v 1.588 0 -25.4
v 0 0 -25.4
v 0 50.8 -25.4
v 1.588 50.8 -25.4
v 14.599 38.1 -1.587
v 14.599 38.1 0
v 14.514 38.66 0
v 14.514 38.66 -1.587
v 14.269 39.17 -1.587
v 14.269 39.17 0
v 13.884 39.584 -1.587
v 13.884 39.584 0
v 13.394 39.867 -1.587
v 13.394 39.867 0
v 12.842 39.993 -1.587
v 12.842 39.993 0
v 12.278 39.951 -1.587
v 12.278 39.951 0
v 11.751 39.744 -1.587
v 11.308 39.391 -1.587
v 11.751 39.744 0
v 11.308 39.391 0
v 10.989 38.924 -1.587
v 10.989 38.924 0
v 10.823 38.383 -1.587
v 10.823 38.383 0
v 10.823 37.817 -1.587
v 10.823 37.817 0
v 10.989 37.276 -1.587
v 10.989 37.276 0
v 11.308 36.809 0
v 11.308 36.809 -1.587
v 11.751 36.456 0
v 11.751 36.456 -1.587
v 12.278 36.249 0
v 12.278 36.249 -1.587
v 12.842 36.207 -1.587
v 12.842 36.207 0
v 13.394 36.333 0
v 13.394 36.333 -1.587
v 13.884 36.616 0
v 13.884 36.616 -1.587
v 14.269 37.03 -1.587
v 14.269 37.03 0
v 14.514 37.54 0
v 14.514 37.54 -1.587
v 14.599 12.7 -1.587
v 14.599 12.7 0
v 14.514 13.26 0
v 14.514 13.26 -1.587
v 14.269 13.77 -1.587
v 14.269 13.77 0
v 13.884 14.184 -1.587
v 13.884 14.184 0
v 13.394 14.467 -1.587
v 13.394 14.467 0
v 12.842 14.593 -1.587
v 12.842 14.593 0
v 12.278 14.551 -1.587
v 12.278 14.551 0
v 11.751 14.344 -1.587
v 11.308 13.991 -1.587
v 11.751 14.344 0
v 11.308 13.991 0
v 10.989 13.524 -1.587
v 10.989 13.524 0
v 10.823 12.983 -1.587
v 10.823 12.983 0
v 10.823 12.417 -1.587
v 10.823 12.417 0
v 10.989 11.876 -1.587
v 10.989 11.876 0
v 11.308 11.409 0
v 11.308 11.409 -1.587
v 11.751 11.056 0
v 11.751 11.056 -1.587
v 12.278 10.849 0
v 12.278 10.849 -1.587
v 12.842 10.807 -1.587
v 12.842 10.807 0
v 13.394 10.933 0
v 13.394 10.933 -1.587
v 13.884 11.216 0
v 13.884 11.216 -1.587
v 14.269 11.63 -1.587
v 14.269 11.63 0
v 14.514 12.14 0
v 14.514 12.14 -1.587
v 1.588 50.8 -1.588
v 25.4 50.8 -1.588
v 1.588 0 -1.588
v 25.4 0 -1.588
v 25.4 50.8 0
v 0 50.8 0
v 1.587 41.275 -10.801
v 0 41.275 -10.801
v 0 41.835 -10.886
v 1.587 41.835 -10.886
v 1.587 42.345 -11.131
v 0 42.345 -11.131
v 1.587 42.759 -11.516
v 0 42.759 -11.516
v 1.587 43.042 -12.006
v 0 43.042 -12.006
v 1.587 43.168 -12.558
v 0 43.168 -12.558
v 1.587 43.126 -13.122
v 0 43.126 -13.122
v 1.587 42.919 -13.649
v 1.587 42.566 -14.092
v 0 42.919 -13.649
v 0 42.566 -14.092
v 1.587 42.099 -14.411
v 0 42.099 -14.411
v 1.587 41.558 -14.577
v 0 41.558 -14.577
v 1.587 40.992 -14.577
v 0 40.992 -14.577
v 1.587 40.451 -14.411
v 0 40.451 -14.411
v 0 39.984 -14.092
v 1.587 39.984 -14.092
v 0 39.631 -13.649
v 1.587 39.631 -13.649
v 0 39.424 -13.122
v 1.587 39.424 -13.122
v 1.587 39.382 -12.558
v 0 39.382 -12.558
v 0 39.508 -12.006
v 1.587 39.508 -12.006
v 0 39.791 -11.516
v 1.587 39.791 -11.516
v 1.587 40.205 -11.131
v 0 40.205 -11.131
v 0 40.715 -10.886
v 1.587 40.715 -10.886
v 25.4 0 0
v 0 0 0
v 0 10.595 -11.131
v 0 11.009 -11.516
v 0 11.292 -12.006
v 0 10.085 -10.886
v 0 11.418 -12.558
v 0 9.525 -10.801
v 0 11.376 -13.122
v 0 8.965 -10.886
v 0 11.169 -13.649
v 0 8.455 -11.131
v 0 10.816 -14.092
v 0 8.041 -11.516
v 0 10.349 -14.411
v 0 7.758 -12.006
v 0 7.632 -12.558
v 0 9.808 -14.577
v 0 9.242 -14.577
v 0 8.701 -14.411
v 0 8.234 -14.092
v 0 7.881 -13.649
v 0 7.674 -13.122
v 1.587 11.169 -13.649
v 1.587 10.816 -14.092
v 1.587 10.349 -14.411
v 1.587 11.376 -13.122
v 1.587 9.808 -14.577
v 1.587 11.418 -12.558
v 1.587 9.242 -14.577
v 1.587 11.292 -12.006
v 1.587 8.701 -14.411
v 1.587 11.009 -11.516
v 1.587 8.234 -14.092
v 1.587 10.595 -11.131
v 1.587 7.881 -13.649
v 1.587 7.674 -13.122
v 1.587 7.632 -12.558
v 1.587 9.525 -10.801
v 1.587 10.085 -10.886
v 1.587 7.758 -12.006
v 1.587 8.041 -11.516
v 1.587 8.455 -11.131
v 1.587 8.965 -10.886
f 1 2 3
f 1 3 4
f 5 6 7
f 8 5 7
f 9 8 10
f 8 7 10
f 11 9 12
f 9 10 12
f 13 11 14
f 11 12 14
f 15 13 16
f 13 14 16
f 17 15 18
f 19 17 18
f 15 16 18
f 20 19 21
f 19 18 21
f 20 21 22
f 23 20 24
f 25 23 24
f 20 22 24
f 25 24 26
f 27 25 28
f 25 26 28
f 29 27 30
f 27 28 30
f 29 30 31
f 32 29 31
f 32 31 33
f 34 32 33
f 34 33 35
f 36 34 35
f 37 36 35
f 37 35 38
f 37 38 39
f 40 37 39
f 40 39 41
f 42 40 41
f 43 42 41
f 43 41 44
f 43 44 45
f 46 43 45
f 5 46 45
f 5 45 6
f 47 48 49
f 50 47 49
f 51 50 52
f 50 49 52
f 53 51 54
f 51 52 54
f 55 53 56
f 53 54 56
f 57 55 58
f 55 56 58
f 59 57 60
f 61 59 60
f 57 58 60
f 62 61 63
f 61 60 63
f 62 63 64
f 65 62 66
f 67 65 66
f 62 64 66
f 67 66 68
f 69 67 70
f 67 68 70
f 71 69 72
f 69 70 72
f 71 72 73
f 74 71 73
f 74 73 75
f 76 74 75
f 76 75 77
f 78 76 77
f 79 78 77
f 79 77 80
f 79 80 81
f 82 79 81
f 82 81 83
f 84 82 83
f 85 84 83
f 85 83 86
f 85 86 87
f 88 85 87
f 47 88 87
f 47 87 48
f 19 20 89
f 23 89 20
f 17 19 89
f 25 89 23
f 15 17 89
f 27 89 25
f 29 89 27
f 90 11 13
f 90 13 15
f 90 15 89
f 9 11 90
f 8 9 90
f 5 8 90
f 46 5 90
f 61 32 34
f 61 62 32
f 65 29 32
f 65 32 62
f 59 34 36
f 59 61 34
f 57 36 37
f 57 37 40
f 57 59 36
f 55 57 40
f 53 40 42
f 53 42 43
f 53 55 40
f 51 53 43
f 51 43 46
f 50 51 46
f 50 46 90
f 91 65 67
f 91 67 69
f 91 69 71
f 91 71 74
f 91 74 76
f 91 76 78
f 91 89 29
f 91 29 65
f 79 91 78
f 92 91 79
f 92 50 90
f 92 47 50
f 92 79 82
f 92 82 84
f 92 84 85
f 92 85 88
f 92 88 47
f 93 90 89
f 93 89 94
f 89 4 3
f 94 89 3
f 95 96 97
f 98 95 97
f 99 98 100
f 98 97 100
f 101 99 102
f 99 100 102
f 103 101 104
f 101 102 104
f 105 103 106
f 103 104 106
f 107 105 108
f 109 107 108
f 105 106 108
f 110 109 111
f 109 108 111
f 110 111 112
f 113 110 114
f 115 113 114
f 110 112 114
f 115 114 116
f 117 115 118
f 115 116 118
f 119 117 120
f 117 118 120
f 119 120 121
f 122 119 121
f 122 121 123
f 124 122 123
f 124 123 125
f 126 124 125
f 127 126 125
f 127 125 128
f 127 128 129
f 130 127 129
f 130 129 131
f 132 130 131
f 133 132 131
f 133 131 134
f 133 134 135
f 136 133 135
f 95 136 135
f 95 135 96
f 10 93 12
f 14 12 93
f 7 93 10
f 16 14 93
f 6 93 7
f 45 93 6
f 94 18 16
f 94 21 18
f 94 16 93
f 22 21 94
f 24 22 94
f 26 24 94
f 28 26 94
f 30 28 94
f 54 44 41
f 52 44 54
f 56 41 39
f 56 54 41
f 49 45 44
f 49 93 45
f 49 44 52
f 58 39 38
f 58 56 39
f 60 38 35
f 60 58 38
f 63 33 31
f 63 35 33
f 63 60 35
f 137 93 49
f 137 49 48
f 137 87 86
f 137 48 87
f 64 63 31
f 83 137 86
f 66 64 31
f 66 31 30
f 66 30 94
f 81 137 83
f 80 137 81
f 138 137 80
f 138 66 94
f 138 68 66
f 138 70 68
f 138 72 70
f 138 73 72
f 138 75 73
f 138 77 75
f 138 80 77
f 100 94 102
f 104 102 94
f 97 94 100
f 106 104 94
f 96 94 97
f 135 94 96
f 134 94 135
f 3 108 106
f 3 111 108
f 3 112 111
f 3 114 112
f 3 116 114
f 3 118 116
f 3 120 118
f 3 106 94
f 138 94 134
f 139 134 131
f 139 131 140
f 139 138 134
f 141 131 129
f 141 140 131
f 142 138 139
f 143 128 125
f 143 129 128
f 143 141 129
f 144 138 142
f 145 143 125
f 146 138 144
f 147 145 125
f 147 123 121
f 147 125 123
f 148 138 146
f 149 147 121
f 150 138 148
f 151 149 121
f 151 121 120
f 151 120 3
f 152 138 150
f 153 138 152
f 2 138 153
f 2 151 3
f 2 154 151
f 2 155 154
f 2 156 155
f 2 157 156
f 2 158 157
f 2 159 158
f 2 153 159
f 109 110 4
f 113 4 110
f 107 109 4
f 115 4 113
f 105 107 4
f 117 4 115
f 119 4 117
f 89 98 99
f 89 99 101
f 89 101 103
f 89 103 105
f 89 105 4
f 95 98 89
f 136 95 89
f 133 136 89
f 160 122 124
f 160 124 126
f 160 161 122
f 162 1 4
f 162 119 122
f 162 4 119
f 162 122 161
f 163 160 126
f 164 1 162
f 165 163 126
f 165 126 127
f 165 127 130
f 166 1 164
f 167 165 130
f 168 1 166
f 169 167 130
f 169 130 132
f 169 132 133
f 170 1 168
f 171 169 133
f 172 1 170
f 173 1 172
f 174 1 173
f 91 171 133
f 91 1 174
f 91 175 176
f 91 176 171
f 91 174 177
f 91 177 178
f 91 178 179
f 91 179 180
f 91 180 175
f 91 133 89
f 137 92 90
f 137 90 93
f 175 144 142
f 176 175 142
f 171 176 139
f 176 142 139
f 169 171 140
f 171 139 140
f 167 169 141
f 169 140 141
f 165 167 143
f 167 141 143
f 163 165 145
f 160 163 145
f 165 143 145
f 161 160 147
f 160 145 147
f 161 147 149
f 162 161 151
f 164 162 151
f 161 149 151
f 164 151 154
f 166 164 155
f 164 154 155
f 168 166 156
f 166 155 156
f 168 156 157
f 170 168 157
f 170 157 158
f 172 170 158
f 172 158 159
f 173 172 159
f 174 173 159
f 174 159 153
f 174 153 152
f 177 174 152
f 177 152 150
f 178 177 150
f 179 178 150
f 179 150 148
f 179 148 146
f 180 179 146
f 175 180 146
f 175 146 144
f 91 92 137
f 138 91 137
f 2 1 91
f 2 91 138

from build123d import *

# Parameters (mm, degrees)
BOSS_EXTRUDE1_DEPTH   = 50.8
F_6_CLEARANCE_HOLE1_D = 3.7973
F_6_CLEARANCE_HOLE2_D = 3.7973


with BuildPart() as part:
    # Sketch1 → Boss-Extrude1 (new body)
    with BuildSketch(Plane(origin=(0, 0, 0), x_dir=(1, 0, 0), z_dir=(0, 1, 0))):
        Polygon((0, 25.4), (1.5875, 25.4), (1.5875, 1.5875), (25.4, 1.5875), (25.4, 0), (0, 0), align=None)
    extrude(amount=BOSS_EXTRUDE1_DEPTH)

    # #6 Clearance Hole1 (through all)
    with Locations(Plane(origin=(0, 0, -1.5875), x_dir=(-1, 0, 0), z_dir=(0, 0, -1))):
        with Locations((-12.7, 38.1), (-12.7, 12.7)):
            Hole(F_6_CLEARANCE_HOLE1_D / 2)

    # #6 Clearance Hole2 (through all)
    with Locations(Plane(origin=(1.5875, 0, 0), x_dir=(0, 0, -1), z_dir=(1, 0, 0))):
        with Locations((12.7, 41.275), (12.7, 9.525)):
            Hole(F_6_CLEARANCE_HOLE2_D / 2)


solid = part.part
